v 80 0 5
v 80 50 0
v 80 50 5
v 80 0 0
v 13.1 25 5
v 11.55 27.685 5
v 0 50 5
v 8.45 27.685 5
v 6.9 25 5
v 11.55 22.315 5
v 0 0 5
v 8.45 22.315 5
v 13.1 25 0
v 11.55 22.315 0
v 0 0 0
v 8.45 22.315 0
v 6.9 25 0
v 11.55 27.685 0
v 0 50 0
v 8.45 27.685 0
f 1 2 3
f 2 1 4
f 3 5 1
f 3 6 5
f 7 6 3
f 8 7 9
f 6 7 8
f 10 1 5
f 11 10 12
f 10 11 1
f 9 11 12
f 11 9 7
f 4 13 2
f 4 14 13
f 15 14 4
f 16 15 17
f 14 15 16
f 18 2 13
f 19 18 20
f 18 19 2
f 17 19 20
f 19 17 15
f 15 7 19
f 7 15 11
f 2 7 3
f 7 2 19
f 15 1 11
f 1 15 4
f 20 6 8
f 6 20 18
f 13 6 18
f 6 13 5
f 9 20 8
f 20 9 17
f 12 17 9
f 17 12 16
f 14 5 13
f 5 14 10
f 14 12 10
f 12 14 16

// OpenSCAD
//shaving brush base
difference () {
    cube([80,50,5]);

    translate([10,25,-1])
        cylinder (h=20, r=3.1, $fn=6);
}
